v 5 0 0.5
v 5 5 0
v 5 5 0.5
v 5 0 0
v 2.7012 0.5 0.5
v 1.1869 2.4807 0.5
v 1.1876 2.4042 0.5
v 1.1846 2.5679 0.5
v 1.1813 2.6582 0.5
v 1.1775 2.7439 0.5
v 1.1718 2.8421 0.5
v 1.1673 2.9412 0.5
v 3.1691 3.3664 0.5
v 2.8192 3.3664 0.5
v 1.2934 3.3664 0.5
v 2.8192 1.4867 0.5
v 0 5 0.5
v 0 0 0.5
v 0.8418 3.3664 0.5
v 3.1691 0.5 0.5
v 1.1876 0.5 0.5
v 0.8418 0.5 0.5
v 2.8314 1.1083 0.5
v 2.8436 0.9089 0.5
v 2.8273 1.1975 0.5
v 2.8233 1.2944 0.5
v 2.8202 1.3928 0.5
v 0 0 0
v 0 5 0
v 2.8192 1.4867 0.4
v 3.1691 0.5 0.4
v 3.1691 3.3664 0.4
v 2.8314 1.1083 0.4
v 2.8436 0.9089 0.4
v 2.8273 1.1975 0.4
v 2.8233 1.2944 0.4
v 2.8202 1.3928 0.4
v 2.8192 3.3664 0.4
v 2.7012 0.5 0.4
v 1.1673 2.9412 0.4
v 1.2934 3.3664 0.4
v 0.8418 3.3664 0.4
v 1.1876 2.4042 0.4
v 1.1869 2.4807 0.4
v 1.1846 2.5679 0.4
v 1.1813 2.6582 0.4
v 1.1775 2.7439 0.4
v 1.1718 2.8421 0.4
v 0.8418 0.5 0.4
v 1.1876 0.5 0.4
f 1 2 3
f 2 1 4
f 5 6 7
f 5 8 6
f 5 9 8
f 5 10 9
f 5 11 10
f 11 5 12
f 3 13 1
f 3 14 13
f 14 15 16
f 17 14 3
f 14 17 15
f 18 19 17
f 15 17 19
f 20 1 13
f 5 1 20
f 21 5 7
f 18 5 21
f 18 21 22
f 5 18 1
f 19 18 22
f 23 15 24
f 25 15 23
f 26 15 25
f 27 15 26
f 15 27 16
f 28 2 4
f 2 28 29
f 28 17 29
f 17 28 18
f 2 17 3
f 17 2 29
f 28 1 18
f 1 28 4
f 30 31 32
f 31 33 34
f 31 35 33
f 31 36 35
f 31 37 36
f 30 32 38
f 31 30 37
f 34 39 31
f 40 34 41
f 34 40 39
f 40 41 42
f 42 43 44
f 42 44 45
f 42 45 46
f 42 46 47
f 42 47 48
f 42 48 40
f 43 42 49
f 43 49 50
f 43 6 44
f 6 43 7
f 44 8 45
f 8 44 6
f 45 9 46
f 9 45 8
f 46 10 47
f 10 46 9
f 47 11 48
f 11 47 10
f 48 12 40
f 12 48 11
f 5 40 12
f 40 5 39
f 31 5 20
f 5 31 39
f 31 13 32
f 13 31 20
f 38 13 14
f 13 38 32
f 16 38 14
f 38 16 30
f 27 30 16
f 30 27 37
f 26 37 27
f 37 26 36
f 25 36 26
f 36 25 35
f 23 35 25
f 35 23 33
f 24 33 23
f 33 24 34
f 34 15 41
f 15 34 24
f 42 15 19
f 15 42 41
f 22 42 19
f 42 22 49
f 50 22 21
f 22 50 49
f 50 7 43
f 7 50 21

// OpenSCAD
module keybase() {
    cube(size = [5, 5 ,0.5], center = false);
}
module character(c) {
    echo("key for char ", c);
    translate([.5,.5,.4]) {
        linear_extrude(height = 0.5) {
            text(c,size=3);
        }
    }
}
module keycap(c){
   difference() {
       keybase();
       character(c);
   } 
}
keycap("N");
